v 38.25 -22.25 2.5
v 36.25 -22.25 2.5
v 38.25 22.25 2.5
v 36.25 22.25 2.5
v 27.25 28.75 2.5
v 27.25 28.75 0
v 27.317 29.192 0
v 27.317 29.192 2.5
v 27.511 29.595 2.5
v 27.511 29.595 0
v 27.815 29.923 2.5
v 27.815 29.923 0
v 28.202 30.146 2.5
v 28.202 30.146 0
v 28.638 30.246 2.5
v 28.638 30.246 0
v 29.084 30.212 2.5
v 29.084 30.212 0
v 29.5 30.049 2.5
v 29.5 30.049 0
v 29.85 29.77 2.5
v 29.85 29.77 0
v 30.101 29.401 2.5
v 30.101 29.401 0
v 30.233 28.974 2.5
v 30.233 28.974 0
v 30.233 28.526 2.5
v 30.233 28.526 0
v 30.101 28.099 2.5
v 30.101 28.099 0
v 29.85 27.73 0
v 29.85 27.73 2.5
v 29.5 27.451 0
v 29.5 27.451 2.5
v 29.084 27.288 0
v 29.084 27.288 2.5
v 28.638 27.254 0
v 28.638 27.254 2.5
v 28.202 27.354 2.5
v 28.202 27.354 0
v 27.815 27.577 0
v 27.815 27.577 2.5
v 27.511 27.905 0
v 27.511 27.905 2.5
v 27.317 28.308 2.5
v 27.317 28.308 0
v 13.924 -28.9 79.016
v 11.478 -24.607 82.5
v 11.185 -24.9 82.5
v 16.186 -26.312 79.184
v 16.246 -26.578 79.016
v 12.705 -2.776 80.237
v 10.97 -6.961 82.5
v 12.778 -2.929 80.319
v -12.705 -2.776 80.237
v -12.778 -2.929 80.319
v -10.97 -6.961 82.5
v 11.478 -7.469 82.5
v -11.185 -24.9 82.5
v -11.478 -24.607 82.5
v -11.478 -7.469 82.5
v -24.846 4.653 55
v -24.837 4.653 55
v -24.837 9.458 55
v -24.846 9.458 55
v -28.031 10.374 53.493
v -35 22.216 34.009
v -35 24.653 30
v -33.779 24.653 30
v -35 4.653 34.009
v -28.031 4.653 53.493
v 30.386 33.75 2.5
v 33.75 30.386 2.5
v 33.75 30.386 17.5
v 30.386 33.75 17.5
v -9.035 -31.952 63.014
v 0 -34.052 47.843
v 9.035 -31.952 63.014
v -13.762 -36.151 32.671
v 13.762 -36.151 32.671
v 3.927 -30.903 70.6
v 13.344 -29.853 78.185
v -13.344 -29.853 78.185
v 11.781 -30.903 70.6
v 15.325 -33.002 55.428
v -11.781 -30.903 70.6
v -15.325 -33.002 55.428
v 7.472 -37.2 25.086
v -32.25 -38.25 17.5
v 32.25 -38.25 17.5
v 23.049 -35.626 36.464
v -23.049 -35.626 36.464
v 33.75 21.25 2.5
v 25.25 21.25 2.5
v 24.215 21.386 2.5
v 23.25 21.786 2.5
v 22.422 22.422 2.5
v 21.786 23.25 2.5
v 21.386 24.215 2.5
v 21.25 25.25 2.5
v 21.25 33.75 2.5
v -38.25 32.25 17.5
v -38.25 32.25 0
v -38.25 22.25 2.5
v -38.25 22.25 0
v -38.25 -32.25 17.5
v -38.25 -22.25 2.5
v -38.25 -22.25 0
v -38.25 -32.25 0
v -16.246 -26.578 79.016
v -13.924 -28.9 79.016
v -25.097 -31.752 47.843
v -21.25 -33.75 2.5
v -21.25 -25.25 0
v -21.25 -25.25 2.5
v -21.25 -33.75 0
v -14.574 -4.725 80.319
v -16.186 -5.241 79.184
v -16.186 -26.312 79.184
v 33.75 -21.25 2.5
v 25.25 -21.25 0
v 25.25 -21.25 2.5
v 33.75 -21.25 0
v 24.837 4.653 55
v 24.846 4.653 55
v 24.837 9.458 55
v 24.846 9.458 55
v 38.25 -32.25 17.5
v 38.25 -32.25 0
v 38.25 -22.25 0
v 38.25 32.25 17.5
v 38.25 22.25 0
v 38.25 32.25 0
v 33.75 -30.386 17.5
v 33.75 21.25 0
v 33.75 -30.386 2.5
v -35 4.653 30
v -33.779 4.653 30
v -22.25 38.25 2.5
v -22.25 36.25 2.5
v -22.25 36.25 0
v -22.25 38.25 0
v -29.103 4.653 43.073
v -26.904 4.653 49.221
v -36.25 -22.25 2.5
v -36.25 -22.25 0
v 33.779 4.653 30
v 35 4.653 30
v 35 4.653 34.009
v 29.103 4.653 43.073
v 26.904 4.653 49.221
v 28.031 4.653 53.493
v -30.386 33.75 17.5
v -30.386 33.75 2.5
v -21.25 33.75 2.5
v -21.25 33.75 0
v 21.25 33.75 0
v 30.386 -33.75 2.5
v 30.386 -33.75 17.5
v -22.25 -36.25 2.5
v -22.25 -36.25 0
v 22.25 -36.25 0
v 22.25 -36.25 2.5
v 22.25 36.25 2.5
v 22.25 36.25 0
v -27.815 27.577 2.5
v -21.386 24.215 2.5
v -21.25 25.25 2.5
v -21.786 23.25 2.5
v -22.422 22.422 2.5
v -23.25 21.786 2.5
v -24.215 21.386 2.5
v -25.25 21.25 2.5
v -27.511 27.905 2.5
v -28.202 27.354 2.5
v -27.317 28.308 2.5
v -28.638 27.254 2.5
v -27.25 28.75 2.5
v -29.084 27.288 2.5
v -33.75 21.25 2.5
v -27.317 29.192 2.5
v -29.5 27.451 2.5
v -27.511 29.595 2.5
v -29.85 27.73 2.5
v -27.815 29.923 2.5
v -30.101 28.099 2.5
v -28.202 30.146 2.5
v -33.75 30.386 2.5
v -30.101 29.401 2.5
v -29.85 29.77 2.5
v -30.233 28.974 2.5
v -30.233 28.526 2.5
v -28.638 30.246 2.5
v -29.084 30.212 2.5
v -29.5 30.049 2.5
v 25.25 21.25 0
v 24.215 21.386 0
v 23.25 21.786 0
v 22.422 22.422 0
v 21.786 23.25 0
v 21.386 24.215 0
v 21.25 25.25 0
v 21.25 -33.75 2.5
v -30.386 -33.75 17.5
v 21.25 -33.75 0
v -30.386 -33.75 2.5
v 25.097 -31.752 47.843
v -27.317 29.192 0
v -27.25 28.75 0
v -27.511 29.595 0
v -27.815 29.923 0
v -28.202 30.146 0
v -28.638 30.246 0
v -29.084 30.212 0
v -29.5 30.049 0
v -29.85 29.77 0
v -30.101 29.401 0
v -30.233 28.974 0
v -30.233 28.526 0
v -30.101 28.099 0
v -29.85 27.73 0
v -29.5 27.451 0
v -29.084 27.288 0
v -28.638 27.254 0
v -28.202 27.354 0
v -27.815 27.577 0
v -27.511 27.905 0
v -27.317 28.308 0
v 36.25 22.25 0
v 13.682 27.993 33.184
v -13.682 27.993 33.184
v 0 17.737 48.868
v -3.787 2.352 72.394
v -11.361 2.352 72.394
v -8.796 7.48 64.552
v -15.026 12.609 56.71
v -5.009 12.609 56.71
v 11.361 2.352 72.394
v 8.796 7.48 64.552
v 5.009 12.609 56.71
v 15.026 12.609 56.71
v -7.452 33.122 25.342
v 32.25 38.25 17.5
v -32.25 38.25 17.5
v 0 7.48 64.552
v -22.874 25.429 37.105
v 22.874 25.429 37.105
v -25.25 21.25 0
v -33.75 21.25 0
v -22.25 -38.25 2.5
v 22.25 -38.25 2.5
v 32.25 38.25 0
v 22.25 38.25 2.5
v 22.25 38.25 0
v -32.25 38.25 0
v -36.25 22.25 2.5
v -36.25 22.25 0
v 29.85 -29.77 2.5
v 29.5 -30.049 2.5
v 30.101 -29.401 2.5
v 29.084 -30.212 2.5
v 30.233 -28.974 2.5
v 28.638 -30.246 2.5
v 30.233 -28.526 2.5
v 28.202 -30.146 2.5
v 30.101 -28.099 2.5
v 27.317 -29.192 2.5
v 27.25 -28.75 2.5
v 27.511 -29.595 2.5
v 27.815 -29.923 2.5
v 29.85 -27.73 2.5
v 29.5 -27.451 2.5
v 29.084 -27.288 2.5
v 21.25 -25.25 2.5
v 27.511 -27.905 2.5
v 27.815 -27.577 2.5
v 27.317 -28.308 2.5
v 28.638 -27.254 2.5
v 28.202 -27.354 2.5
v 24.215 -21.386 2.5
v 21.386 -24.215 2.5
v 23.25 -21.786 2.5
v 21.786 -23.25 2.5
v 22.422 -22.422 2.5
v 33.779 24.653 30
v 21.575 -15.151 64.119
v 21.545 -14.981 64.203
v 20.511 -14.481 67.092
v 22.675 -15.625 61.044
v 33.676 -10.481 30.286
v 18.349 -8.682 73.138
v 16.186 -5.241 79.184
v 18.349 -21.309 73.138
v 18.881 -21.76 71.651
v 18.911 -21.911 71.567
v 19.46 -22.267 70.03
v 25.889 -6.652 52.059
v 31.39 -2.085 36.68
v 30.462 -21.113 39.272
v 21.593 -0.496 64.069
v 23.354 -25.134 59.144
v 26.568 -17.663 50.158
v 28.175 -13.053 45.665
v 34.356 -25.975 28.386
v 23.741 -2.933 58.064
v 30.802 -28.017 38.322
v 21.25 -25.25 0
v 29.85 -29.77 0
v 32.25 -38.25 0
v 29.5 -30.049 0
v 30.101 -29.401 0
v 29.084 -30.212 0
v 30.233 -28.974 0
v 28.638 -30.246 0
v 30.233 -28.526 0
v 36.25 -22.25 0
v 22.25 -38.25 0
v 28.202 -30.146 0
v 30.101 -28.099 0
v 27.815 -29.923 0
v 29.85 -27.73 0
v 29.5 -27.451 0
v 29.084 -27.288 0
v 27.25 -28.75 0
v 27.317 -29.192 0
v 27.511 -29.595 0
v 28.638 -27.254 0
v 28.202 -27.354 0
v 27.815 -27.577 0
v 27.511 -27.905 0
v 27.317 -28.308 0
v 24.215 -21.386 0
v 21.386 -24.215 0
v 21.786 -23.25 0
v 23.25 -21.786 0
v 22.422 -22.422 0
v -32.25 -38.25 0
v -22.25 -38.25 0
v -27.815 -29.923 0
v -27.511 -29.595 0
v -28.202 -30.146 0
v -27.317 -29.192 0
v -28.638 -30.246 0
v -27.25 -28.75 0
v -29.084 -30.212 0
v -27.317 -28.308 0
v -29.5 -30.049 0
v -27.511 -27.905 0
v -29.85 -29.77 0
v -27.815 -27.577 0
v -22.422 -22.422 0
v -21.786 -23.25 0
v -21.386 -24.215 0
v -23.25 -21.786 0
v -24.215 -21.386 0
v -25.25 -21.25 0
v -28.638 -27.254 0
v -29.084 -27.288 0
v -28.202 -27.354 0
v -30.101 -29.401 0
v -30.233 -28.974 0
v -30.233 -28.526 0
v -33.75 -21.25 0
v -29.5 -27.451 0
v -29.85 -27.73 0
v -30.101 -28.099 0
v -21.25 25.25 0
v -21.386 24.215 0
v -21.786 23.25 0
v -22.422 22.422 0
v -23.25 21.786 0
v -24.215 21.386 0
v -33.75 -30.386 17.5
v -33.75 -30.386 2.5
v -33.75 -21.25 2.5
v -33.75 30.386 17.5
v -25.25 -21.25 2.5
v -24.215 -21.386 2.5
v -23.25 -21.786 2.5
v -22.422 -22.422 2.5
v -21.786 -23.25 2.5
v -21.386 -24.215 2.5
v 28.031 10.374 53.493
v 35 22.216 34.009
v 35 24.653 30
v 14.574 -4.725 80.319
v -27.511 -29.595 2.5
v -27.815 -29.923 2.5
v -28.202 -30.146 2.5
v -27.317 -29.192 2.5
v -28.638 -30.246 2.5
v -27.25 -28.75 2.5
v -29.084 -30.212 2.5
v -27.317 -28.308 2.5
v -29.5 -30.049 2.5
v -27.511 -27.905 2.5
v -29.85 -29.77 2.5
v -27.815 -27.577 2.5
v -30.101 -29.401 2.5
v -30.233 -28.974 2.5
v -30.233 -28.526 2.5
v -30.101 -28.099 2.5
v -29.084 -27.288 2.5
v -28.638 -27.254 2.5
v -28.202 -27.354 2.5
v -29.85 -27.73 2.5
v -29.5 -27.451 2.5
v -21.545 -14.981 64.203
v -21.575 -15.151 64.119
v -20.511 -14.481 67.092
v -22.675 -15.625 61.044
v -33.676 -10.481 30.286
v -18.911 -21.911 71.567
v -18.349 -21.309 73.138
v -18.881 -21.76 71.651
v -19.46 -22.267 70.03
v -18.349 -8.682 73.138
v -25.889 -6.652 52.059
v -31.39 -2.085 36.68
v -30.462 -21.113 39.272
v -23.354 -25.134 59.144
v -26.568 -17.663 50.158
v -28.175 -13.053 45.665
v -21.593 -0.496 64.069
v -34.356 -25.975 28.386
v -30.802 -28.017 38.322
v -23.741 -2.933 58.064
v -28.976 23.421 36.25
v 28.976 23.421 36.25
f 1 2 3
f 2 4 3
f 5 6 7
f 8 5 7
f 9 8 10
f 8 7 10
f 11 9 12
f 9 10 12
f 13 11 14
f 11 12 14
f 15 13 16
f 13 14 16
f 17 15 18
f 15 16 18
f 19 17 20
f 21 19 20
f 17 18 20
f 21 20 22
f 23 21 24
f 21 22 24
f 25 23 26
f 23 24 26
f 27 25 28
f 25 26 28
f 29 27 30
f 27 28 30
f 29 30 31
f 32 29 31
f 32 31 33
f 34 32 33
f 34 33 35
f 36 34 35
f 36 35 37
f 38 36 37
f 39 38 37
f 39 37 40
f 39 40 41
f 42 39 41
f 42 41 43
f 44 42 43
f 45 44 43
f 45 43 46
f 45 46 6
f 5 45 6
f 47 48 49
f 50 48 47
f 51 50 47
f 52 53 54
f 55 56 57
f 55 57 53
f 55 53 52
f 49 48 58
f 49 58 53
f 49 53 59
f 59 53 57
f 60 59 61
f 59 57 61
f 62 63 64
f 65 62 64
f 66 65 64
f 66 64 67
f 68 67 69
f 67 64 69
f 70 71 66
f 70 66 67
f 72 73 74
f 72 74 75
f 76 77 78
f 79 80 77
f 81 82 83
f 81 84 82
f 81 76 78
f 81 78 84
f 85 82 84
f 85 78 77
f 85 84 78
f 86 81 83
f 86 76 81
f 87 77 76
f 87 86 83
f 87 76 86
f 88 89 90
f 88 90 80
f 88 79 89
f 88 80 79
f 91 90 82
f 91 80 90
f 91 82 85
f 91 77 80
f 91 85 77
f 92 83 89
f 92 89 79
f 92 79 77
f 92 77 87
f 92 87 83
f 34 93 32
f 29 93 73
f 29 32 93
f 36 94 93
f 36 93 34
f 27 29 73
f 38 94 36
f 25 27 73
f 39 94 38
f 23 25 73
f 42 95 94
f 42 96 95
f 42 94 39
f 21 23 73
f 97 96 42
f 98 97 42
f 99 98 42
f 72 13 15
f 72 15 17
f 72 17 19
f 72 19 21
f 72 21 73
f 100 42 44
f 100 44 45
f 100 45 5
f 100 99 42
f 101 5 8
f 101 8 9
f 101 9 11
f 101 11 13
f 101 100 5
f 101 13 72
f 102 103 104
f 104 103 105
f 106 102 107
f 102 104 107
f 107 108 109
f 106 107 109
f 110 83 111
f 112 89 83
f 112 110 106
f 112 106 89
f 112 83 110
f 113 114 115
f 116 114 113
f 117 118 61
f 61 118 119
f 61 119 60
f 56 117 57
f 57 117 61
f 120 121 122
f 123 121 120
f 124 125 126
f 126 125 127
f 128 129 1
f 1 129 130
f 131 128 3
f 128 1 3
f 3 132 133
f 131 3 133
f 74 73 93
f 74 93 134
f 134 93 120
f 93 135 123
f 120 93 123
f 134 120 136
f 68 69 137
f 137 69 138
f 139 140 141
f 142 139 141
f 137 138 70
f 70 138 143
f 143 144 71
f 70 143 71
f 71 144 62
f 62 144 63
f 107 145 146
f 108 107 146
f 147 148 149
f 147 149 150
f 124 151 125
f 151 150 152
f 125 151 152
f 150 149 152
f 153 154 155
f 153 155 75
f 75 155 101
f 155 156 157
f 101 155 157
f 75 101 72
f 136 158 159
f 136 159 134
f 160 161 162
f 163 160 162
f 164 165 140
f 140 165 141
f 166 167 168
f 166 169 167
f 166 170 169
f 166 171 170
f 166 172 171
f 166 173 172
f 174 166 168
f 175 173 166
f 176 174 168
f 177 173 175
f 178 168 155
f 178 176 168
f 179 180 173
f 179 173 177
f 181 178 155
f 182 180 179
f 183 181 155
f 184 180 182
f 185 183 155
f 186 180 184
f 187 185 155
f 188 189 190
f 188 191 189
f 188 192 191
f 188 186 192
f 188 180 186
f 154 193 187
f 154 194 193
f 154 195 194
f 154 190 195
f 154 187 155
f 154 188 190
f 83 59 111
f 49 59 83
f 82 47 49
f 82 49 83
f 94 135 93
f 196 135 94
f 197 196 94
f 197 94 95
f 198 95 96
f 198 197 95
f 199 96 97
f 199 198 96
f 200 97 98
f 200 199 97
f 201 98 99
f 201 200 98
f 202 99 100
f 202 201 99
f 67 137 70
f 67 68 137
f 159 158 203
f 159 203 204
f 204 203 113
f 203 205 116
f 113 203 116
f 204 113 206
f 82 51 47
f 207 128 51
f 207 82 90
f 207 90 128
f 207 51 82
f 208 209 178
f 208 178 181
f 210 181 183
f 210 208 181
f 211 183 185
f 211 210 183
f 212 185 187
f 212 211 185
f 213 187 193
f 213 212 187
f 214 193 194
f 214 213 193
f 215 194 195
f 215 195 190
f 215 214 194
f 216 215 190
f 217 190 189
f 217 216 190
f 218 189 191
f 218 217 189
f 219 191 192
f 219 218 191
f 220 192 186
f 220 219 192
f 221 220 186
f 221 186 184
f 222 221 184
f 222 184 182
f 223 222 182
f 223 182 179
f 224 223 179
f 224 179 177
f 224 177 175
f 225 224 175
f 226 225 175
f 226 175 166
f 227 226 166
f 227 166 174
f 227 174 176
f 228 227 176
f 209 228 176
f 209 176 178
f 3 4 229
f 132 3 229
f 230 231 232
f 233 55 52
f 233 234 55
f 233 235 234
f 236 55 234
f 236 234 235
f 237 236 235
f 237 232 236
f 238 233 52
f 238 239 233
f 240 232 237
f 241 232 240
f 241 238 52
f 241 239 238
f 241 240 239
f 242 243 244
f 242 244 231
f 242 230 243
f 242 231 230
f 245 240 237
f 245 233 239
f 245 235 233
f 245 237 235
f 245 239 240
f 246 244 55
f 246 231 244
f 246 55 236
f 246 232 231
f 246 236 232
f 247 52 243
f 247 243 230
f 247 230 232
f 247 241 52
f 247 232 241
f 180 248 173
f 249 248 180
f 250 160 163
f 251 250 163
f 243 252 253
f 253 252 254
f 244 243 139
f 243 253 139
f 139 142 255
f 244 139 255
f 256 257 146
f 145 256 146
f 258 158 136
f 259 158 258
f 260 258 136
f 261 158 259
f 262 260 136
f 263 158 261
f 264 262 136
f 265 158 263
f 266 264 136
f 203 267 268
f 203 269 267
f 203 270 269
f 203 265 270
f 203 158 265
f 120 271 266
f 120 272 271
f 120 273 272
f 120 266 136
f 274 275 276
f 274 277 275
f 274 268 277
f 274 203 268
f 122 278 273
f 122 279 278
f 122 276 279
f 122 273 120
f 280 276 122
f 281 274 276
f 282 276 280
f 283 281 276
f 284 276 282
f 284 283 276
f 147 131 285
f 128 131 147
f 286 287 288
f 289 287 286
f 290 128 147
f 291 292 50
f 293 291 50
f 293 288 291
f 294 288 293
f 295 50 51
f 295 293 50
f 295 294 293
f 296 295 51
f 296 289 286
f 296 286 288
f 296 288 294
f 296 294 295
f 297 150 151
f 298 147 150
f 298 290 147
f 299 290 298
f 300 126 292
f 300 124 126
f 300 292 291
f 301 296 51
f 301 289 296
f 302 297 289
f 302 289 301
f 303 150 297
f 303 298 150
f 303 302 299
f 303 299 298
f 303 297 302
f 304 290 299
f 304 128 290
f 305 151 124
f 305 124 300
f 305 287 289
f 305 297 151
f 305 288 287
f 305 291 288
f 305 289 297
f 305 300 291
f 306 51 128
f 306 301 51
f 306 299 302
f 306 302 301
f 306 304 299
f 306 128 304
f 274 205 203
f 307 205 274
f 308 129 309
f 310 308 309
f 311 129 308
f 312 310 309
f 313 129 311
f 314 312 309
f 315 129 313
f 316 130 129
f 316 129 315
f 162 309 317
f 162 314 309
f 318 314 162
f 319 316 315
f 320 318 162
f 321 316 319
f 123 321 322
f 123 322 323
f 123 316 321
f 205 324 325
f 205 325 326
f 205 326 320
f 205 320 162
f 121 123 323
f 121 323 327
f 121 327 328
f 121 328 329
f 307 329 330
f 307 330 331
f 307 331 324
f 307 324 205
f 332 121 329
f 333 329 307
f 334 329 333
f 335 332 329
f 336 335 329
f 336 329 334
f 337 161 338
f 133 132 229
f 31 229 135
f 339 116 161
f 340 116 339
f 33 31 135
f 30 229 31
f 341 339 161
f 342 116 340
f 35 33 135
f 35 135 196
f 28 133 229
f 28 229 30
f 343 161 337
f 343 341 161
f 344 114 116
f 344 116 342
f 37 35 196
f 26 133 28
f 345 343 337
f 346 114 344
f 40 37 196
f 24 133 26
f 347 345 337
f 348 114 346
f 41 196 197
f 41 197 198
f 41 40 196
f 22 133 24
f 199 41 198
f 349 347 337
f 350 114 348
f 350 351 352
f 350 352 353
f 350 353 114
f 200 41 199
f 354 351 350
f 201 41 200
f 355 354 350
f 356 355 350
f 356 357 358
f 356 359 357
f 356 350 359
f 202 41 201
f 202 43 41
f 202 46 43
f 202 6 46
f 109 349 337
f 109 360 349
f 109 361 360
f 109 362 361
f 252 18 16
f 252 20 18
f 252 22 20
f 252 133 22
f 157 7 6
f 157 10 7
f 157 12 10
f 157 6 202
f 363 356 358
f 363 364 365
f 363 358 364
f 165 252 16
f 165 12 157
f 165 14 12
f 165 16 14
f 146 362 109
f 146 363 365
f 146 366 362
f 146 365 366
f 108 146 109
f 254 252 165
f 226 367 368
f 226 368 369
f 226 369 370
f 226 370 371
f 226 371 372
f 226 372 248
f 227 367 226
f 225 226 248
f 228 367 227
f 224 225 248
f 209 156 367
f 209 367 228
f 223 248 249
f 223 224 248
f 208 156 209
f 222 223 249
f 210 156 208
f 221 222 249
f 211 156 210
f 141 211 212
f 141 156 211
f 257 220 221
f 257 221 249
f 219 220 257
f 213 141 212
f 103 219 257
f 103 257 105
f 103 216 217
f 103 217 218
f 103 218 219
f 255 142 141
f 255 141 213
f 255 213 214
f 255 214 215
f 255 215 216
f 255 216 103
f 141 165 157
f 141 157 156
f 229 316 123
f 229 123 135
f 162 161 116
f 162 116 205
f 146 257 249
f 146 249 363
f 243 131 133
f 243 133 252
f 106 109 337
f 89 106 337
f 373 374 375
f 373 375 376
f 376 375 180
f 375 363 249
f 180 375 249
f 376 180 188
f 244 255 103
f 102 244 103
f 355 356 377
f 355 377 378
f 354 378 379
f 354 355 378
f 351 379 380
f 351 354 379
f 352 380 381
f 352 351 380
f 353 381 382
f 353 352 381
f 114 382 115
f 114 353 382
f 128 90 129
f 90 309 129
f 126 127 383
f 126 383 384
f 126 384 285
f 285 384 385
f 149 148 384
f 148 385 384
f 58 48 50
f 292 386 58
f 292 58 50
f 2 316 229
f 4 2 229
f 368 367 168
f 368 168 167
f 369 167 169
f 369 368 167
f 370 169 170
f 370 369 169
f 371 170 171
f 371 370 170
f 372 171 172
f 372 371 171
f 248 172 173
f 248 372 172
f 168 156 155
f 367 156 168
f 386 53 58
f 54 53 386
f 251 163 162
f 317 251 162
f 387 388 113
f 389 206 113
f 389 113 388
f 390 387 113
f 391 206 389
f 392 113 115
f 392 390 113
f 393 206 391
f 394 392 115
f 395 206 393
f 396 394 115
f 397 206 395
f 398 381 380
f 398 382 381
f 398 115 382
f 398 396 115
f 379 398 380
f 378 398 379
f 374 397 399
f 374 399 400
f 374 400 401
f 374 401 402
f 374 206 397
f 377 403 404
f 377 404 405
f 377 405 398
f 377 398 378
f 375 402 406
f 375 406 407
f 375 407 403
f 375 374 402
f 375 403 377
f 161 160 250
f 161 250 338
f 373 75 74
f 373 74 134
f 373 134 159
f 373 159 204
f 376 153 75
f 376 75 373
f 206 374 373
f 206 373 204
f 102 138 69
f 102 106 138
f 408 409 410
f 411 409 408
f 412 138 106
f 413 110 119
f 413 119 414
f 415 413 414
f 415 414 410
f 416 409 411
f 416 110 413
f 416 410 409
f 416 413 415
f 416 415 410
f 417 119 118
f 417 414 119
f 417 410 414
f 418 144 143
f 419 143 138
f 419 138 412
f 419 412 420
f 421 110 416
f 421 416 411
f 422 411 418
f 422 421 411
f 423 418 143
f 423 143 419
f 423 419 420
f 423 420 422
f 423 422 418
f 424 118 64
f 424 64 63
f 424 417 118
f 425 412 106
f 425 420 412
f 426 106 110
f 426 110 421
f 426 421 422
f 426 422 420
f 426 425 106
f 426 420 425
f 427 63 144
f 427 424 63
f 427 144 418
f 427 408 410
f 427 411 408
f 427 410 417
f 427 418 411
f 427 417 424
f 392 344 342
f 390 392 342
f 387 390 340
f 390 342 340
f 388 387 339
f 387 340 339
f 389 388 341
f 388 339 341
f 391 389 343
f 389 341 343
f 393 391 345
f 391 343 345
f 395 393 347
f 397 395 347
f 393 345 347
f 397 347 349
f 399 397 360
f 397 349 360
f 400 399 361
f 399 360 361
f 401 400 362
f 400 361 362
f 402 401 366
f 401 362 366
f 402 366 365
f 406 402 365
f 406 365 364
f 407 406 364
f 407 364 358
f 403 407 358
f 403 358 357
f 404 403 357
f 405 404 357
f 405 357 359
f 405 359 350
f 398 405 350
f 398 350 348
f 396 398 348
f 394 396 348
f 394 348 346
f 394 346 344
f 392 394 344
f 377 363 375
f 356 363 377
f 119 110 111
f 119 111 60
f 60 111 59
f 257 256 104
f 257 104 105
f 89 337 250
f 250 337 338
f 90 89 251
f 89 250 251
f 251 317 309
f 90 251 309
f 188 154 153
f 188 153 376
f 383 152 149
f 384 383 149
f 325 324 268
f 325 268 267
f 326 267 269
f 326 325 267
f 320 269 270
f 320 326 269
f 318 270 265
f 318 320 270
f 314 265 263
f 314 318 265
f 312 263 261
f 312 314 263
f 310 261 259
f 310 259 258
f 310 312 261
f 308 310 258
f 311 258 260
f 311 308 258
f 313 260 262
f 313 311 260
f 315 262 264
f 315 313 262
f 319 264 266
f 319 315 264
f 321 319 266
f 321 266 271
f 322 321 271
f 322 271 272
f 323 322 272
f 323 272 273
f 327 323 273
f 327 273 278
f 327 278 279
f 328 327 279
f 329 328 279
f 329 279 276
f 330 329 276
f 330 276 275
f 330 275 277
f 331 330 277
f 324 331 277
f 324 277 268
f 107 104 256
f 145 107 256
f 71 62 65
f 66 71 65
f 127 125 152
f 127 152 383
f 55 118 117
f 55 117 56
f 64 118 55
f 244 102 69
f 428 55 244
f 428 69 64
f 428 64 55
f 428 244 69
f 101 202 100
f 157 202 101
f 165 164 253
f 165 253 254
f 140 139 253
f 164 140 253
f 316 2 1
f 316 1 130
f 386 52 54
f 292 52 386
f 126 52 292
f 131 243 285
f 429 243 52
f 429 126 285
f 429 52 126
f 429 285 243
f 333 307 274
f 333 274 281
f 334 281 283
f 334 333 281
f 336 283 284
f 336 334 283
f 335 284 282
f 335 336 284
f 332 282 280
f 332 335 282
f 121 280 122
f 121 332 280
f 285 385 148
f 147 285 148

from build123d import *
from OCP.BRepFilletAPI import BRepFilletAPI_MakeChamfer

# Parameters (mm, degrees)
BOSS_EXTRUDE1_DEPTH            = 55
SKETCH2_W                      = 67.5
SKETCH2_H                      = 67.5
BOSS_EXTRUDE2_DEPTH            = 2.5
CUT_EXTRUDE1_REACH             = 75.378
SKETCH3_W                      = 16.5
SKETCH3_H                      = 7
SKETCH3_W_2                    = 8
SKETCH3_H_2                    = 16
FILLET1_R                      = 1
CUT_EXTRUDE2_REACH             = 77.187
SKETCH4_R                      = 1.5
MIRROR2_COPY_1_REACH           = 77.187
MIRROR2_COPY_1_SKETCH_R        = 1.5
BOSS_EXTRUDE3_DEPTH            = 16.09
BOSS_EXTRUDE3_DEPTH_BACK       = 23.81
BOSS_EXTRUDE4_DEPTH            = 47
SKETCH7_W                      = 39.9
SKETCH7_H                      = 19.5
CUT_EXTRUDE3_DEPTH             = 9.4
BOSS_EXTRUDE7_DEPTH            = 2
CUT_EXTRUDE6_REACH             = 85.213
CUT_EXTRUDE6_DIRECTION_2_DEPTH = 84.213490493
CUT_EXTRUDE7_REACH             = 74.438
SKETCH14_W                     = 14.7
SKETCH14_H                     = 2
CUT_EXTRUDE8_DEPTH             = 104.526192338
CUT_EXTRUDE8_DEPTH_BACK        = 2.5
SKETCH15_R                     = 1.6
SKETCH16_W                     = 7.5
SKETCH16_H                     = 2.5
BOSS_EXTRUDE8_DEPTH            = 7
CUT_EXTRUDE5_DEPTH             = 2
CUT_EXTRUDE9_REACH             = 74.438
SKETCH17_R                     = 1
SKETCH19_R                     = 3
CUT_EXTRUDE10_DEPTH            = 2.5
BOSS_EXTRUDE9_DEPTH            = 2
CIRPATTERN1_COUNT              = 4
CIRPATTERN2_COUNT              = 4
CUT_EXTRUDE11_DEPTH            = 2.5
BOSS_EXTRUDE12_DEPTH           = 55
CUT_EXTRUDE12_DEPTH            = 85.104012984
CUT_EXTRUDE12_DEPTH_BACK       = 85.104012984
SKETCH23_W                     = 53.743256412
SKETCH23_H                     = 84.17088144
BOSS_EXTRUDE13_DEPTH           = 15
BOSS_EXTRUDE14_DEPTH           = 35
BOSS_EXTRUDE14_DEPTH_BACK      = 35
CUT_EXTRUDE13_REACH            = 94.676
CHAMFER2_SIZE                  = 1.6
CHAMFER2_SIZE2                 = 2.645578105


with BuildPart() as part:
    # Sketch1 → Boss-Extrude1 (new body)
    with BuildSketch(Plane.XY):
        with BuildLine():
            Line((-36.25, 32.25), (-36.25, -32.25))
            ThreePointArc((-36.25, -32.25), (-35.078427125, -35.078427125), (-32.25, -36.25))
            Line((-32.25, -36.25), (32.25, -36.25))
            ThreePointArc((32.25, -36.25), (35.078427125, -35.078427125), (36.25, -32.25))
            Line((36.25, -32.25), (36.25, 32.25))
            ThreePointArc((36.25, 32.25), (35.078427125, 35.078427125), (32.25, 36.25))
            Line((32.25, 36.25), (-32.25, 36.25))
            ThreePointArc((-32.25, 36.25), (-35.078427125, 35.078427125), (-36.25, 32.25))
        make_face()
        with BuildLine():
            Line((-31.75, 33.75), (31.75, 33.75))
            ThreePointArc((31.75, 33.75), (33.164213562, 33.164213562), (33.75, 31.75))
            Line((33.75, 31.75), (33.75, -31.75))
            ThreePointArc((33.75, -31.75), (33.164213562, -33.164213562), (31.75, -33.75))
            Line((31.75, -33.75), (-31.75, -33.75))
            ThreePointArc((-31.75, -33.75), (-33.164213562, -33.164213562), (-33.75, -31.75))
            Line((-33.75, -31.75), (-33.75, 31.75))
            ThreePointArc((-33.75, 31.75), (-33.164213562, 33.164213562), (-31.75, 33.75))
        make_face(mode=Mode.SUBTRACT)
    extrude(amount=BOSS_EXTRUDE1_DEPTH)

    # Sketch2 → Boss-Extrude2 (add)
    with BuildSketch(Plane.XY):
        Rectangle(SKETCH2_W, SKETCH2_H)
    extrude(amount=BOSS_EXTRUDE2_DEPTH)

    # Sketch3 → Cut-Extrude1 (cut, up to next)
    with BuildSketch(Plane.XY.offset(2.5), mode=Mode.PRIVATE) as cut_extrude1_sk1:
        with Locations((-11.63, 14.79)):
            Rectangle(SKETCH3_W, SKETCH3_H)
    cut_extrude1_tool1 = extrude(cut_extrude1_sk1.sketch, amount=-CUT_EXTRUDE1_REACH, mode=Mode.PRIVATE) & part.part
    # Sketch3 → Cut-Extrude1 (cut, up to next)
    with BuildSketch(Plane.XY.offset(2.5), mode=Mode.PRIVATE) as cut_extrude1_sk2:
        Rectangle(SKETCH3_W_2, SKETCH3_H_2)
    cut_extrude1_tool2 = extrude(cut_extrude1_sk2.sketch, amount=-CUT_EXTRUDE1_REACH, mode=Mode.PRIVATE) & part.part
    add(cut_extrude1_tool1.solids().sort_by_distance((-11.63, 14.79, 2.5))[0], mode=Mode.SUBTRACT)
    add(cut_extrude1_tool2.solids().sort_by_distance((0, 0, 2.5))[0], mode=Mode.SUBTRACT)

    # Fillet1
    fillet1_edges = [part.edges().sort_by_distance(p)[0] for p in [
        (-19.88, 11.29, 1.25),
        (-19.88, 18.29, 1.25),
        (-3.38, 18.29, 1.25),
        (-3.38, 11.29, 1.25),
        (4, -8, 1.25),
        (-4, -8, 1.25),
        (-4, 8, 1.25),
        (4, 8, 1.25),
    ]]
    fillet(fillet1_edges, radius=FILLET1_R)

    # Sketch4 → Cut-Extrude2 (cut, up to next)
    with BuildSketch(Plane(origin=(0, 0, 0), x_dir=(-1, 0, 0), z_dir=(0, 0, -1)), mode=Mode.PRIVATE) as cut_extrude2_sk1:
        with Locations((-28.75, 28.75)):
            Circle(SKETCH4_R)
    cut_extrude2_tool1 = extrude(cut_extrude2_sk1.sketch, amount=-CUT_EXTRUDE2_REACH, mode=Mode.PRIVATE) & part.part
    cut_extrude2 = cut_extrude2_tool1.solids().sort_by_distance((28.75, 28.75, 0))[0]
    add(cut_extrude2, mode=Mode.SUBTRACT)

    # Mirror1: Cut-Extrude2 across plane
    add(cut_extrude2.mirror(Plane(origin=(0, 0, 0), x_dir=(0, 0, 1), z_dir=(1, 0, 0))), mode=Mode.SUBTRACT)

    # Mirror2: Cut-Extrude2 across plane
    add(cut_extrude2.mirror(Plane.ZX), mode=Mode.SUBTRACT)

    # Mirror2 copy 1 sketch → Mirror2 copy 1 (cut, up to next)
    with BuildSketch(Plane(origin=(0, 0, 0), x_dir=(1, 0, 0), z_dir=(0, 0, -1)), mode=Mode.PRIVATE) as mirror2_copy_1_sk1:
        with Locations((-28.75, 28.75)):
            Circle(MIRROR2_COPY_1_SKETCH_R)
    mirror2_copy_1_tool1 = extrude(mirror2_copy_1_sk1.sketch, amount=-MIRROR2_COPY_1_REACH, mode=Mode.PRIVATE) & part.part
    add(mirror2_copy_1_tool1.solids().sort_by_distance((-28.75, -28.75, 0))[0], mode=Mode.SUBTRACT)



with BuildPart() as body_2:
    # Sketch5 → Boss-Extrude3 (new, two sides: drawn at the far end of the back side and taken through both)
    with BuildSketch(Plane(origin=(0, 0, 0), x_dir=(0, 0, -1), z_dir=(1, 0, 0)).offset(-BOSS_EXTRUDE3_DEPTH_BACK)):
        Polygon((-14.7, 14), (-64.4, 14), (-64.4, 12), (-62.4, 12), (-16.7, 12), (-16.7, -12), (-62.4, -12), (-64.4, -12), (-64.4, -14), (-14.7, -14), align=None)
    extrude(amount=BOSS_EXTRUDE3_DEPTH + BOSS_EXTRUDE3_DEPTH_BACK)


with BuildPart() as part_1:
    add(part.part)

    add(body_2.part)  # Boss-Extrude4 merges body 2
    # Sketch6 → Boss-Extrude4 (add)
    with BuildSketch(Plane.XY.offset(64.4)):
        Polygon((-23.81, -14), (16.09, -14), (16.09, -16.5), (-2.11, -16.5), (-2.11, -31.25), (16.09, -31.25), (16.09, -33.75), (-23.81, -33.75), (-23.81, -31.25), (-5.61, -31.25), (-5.61, -16.5), (-23.81, -16.5), align=None)
    extrude(amount=-BOSS_EXTRUDE4_DEPTH)

    # Sketch7 → Cut-Extrude3 (cut)
    with BuildSketch(Plane.XY.offset(64.4)):
        with Locations((-3.86, -24)):
            Rectangle(SKETCH7_W, SKETCH7_H)
    extrude(amount=-CUT_EXTRUDE3_DEPTH, mode=Mode.SUBTRACT)

    # Sketch12 → Boss-Extrude7 (add)
    with BuildSketch(Plane(origin=(0, 36.25, 0), x_dir=(1, 0, 0), z_dir=(0, 1, 0))):
        Polygon((29.75, -55), (32.25, -55), (32.25, -52.5), (32.25, -45), (29.75, -45), (29.75, -52.5), (22.25, -52.5), (22.25, -55), align=None)
        Polygon((-32.25, 0), (-32.25, -10), (-29.75, -10), (-29.75, -2.5), (-22.25, -2.5), (-22.25, 0), align=None)
    boss_extrude7 = extrude(amount=BOSS_EXTRUDE7_DEPTH)

    # Sketch13 → Cut-Extrude6 (cut, up to next)
    with BuildSketch(Plane(origin=(0, 0, 0), x_dir=(-1, 0, 0), z_dir=(0, 0, -1)), mode=Mode.PRIVATE) as cut_extrude6_sk1:
        with BuildLine():
            Line((-33.75, 21.25), (-25.25, 21.25))
            ThreePointArc((-25.25, 21.25), (-22.421572875, 22.421572875), (-21.25, 25.25))
            Line((-21.25, 25.25), (-21.25, 33.75))
            Line((-21.25, 33.75), (21.25, 33.75))
            Line((21.25, 33.75), (21.25, 25.25))
            ThreePointArc((21.25, 25.25), (22.421572875, 22.421572875), (25.25, 21.25))
            Line((25.25, 21.25), (33.75, 21.25))
            Line((33.75, 21.25), (33.75, -21.25))
            Line((33.75, -21.25), (25.25, -21.25))
            ThreePointArc((25.25, -21.25), (22.421572875, -22.421572875), (21.25, -25.25))
            Line((21.25, -25.25), (21.25, -33.75))
            Line((21.25, -33.75), (-21.25, -33.75))
            Line((-21.25, -33.75), (-21.25, -25.25))
            ThreePointArc((-21.25, -25.25), (-22.421572875, -22.421572875), (-25.25, -21.25))
            Line((-25.25, -21.25), (-33.75, -21.25))
            Line((-33.75, -21.25), (-33.75, 21.25))
        make_face()
    cut_extrude6_tool1 = extrude(cut_extrude6_sk1.sketch, amount=-CUT_EXTRUDE6_REACH, mode=Mode.PRIVATE) & part_1.part
    add(cut_extrude6_tool1.solids().sort_by_distance((0, 0, 0))[0], mode=Mode.SUBTRACT)

    # Sketch13 → Cut-Extrude6 direction 2 (cut)
    with BuildSketch(Plane(origin=(0, 0, 0), x_dir=(-1, 0, 0), z_dir=(0, 0, -1))):
        with BuildLine():
            Line((-33.75, 21.25), (-25.25, 21.25))
            ThreePointArc((-25.25, 21.25), (-22.421572875, 22.421572875), (-21.25, 25.25))
            Line((-21.25, 25.25), (-21.25, 33.75))
            Line((-21.25, 33.75), (21.25, 33.75))
            Line((21.25, 33.75), (21.25, 25.25))
            ThreePointArc((21.25, 25.25), (22.421572875, 22.421572875), (25.25, 21.25))
            Line((25.25, 21.25), (33.75, 21.25))
            Line((33.75, 21.25), (33.75, -21.25))
            Line((33.75, -21.25), (25.25, -21.25))
            ThreePointArc((25.25, -21.25), (22.421572875, -22.421572875), (21.25, -25.25))
            Line((21.25, -25.25), (21.25, -33.75))
            Line((21.25, -33.75), (-21.25, -33.75))
            Line((-21.25, -33.75), (-21.25, -25.25))
            ThreePointArc((-21.25, -25.25), (-22.421572875, -22.421572875), (-25.25, -21.25))
            Line((-25.25, -21.25), (-33.75, -21.25))
            Line((-33.75, -21.25), (-33.75, 21.25))
        make_face()
    extrude(amount=CUT_EXTRUDE6_DIRECTION_2_DEPTH, mode=Mode.SUBTRACT)

    # Sketch14 → Cut-Extrude7 (cut, up to next)
    with BuildSketch(Plane(origin=(0, 0, 14.7), x_dir=(-1, 0, 0), z_dir=(0, 0, -1)), mode=Mode.PRIVATE) as cut_extrude7_sk1:
        with Locations((16.46, 13)):
            Rectangle(SKETCH14_W, SKETCH14_H)
    cut_extrude7_tool1 = extrude(cut_extrude7_sk1.sketch, amount=-CUT_EXTRUDE7_REACH, mode=Mode.PRIVATE) & part_1.part
    add(cut_extrude7_tool1.solids().sort_by_distance((-16.46, 13, 14.7))[0], mode=Mode.SUBTRACT)

    # Sketch15 → Cut-Extrude8 (cut, two sides: drawn at the far end of the back side and taken through both)
    with BuildSketch(Plane(origin=(0, 36.25, 0), x_dir=(1, 0, 0), z_dir=(0, 1, 0)).offset(-CUT_EXTRUDE8_DEPTH_BACK)):
        with Locations(Location((3.25, -45, 0), (0, 0, 90))):
            Circle(SKETCH15_R)
    extrude(amount=CUT_EXTRUDE8_DEPTH + CUT_EXTRUDE8_DEPTH_BACK, mode=Mode.SUBTRACT)

    # Sketch16 → Boss-Extrude8 (add)
    with BuildSketch(Plane(origin=(-33.75, 0, 0), x_dir=(0, 0, -1), z_dir=(1, 0, 0))):
        with Locations((-12.25, 30.9)):
            Rectangle(SKETCH16_W, SKETCH16_H)
    extrude(amount=BOSS_EXTRUDE8_DEPTH)

    # Sketch11 → Cut-Extrude5 (cut)
    with BuildSketch(Plane(origin=(0, 14, 0), x_dir=(1, 0, 0), z_dir=(0, 1, 0))):
        Polygon((1.19, -39.55), (12.59, -39.55), (12.59, -14.7), (16.09, -14.7), (16.09, -64.4), (12.59, -64.4), (1.19, -64.4), (-23.81, -64.4), (-23.81, -14.7), (1.19, -14.7), align=None)
    extrude(amount=-CUT_EXTRUDE5_DEPTH, mode=Mode.SUBTRACT)

    # Sketch17 → Cut-Extrude9 (cut, up to next)
    with BuildSketch(Plane(origin=(0, 0, 14.7), x_dir=(-1, 0, 0), z_dir=(0, 0, -1)), mode=Mode.PRIVATE) as cut_extrude9_sk1:
        with Locations(Location((-13.59, 9, 0), (0, 0, 90))):
            Circle(SKETCH17_R)
    cut_extrude9_tool1 = extrude(cut_extrude9_sk1.sketch, amount=-CUT_EXTRUDE9_REACH, mode=Mode.PRIVATE) & part_1.part
    # Sketch17 → Cut-Extrude9 (cut, up to next)
    with BuildSketch(Plane(origin=(0, 0, 14.7), x_dir=(-1, 0, 0), z_dir=(0, 0, -1)), mode=Mode.PRIVATE) as cut_extrude9_sk2:
        with Locations(Location((-13.59, -9, 0), (0, 0, 90))):
            Circle(SKETCH17_R)
    cut_extrude9_tool2 = extrude(cut_extrude9_sk2.sketch, amount=-CUT_EXTRUDE9_REACH, mode=Mode.PRIVATE) & part_1.part
    # Sketch17 → Cut-Extrude9 (cut, up to next)
    with BuildSketch(Plane(origin=(0, 0, 14.7), x_dir=(-1, 0, 0), z_dir=(0, 0, -1)), mode=Mode.PRIVATE) as cut_extrude9_sk3:
        with Locations(Location((21.31, -9, 0), (0, 0, 90))):
            Circle(SKETCH17_R)
    cut_extrude9_tool3 = extrude(cut_extrude9_sk3.sketch, amount=-CUT_EXTRUDE9_REACH, mode=Mode.PRIVATE) & part_1.part
    add(cut_extrude9_tool1.solids().sort_by_distance((13.59, 9, 14.7))[0], mode=Mode.SUBTRACT)
    add(cut_extrude9_tool2.solids().sort_by_distance((13.59, -9, 14.7))[0], mode=Mode.SUBTRACT)
    add(cut_extrude9_tool3.solids().sort_by_distance((-21.31, -9, 14.7))[0], mode=Mode.SUBTRACT)

    # Sketch19 → Cut-Extrude10 (cut)
    with BuildSketch(Plane(origin=(0, 36.25, 0), x_dir=(1, 0, 0), z_dir=(0, 1, 0))):
        with Locations(Location((0, -27.5, 0), (0, 0, 270))):
            Circle(SKETCH19_R)
    cut_extrude10 = extrude(amount=-CUT_EXTRUDE10_DEPTH, mode=Mode.SUBTRACT)

    # Sketch20 → Boss-Extrude9 (add)
    with BuildSketch(Plane(origin=(36.25, 0, -36.25), x_dir=(0, 0, 1), z_dir=(-1, 0, 0))):
        Polygon((91.25, 32.25), (81.25, 32.25), (81.25, 29.75), (88.75, 29.75), (88.75, 22.25), (91.25, 22.25), align=None)
        Polygon((36.25, -22.25), (36.25, -32.25), (46.25, -32.25), (46.25, -29.75), (38.75, -29.75), (38.75, -22.25), align=None)
    boss_extrude9 = extrude(amount=-BOSS_EXTRUDE9_DEPTH)

    # CirPattern1: Boss-Extrude7, Cut-Extrude10 ×4 about axis
    cirpattern1_axis = Axis((0, 0, 0), (0, 0, 1))
    add([boss_extrude7.rotate(cirpattern1_axis, i * 360 / CIRPATTERN1_COUNT) for i in range(1, CIRPATTERN1_COUNT)])
    add([cut_extrude10.rotate(cirpattern1_axis, i * 360 / CIRPATTERN1_COUNT) for i in range(1, CIRPATTERN1_COUNT)], mode=Mode.SUBTRACT)

    # CirPattern2: Boss-Extrude9 ×4 about axis
    cirpattern2_axis = Axis((0, 0, 0), (0, 0, 1))
    for i in range(1, CIRPATTERN2_COUNT):
        add(boss_extrude9.rotate(cirpattern2_axis, i * 360 / CIRPATTERN2_COUNT))

    # Sketch21 → Cut-Extrude11 (cut)
    with BuildSketch(Plane.XZ.offset(33.75)):
        with BuildLine():
            Line((-2.11, 25.367419404), (-2.11, 29.632580596))
            ThreePointArc((-2.11, 29.632580596), (3, 27.5), (-2.11, 25.367419404))
        make_face()
    extrude(amount=-CUT_EXTRUDE11_DEPTH, mode=Mode.SUBTRACT)

    # Sketch22 → Boss-Extrude12 (add, through all)
    with BuildSketch(Plane.XY.offset(55)):
        Polygon((-38.25, 32.25), (-32.25, 38.25), (-29.75, 38.25), (-29.75, 33.75), (-33.75, 33.75), (-33.75, 29.75), (-38.25, 29.75), align=None)
        Polygon((33.75, 33.75), (33.75, 29.75), (38.25, 29.75), (38.25, 32.25), (32.25, 38.25), (29.75, 38.25), (29.75, 33.75), align=None)
        Polygon((38.25, -32.25), (32.25, -38.25), (29.75, -38.25), (29.75, -33.75), (33.75, -33.75), (33.75, -29.75), (38.25, -29.75), align=None)
        Polygon((-33.75, -33.75), (-33.75, -29.75), (-38.25, -29.75), (-38.25, -32.25), (-32.25, -38.25), (-29.75, -38.25), (-29.75, -33.75), align=None)
    extrude(amount=-BOSS_EXTRUDE12_DEPTH)

    # Sketch23 → Cut-Extrude12 (cut, two sides: drawn at the far end of the back side and taken through both)
    with BuildSketch(Plane(origin=(0, 0, 0), x_dir=(0, 0, -1), z_dir=(1, 0, 0)).offset(-CUT_EXTRUDE12_DEPTH_BACK)):
        with Locations((-29.371628206, -1.519752026)):
            Rectangle(SKETCH23_W, SKETCH23_H)
    extrude(amount=CUT_EXTRUDE12_DEPTH + CUT_EXTRUDE12_DEPTH_BACK, mode=Mode.SUBTRACT)


with BuildPart() as body_2_2:
    # of the pieces the cut leaves, the one that is kept (cut_extrude12_keep)
    add(part_1.part.solids().sort_by_distance((-36.25, 22.25, 0))[0])



with BuildPart() as body_2_3:
    # Loft1: read off the stored shape, not the designer's step
    # Loft1: loft between two sections, ruled curve by curve
    loft1_from = [
        Edge.make_line((-15, -26.256240287, 82.5), (-15, -7.256240287, 82.5)),
        Edge.make_line((-15, -7.256240287, 82.5), (-12, -4.256240287, 82.5)),
        Edge.make_line((-12, -29.256240287, 82.5), (-15, -26.256240287, 82.5)),
        Edge.make_line((12, -29.256240287, 82.5), (-12, -29.256240287, 82.5)),
        Edge.make_line((15, -26.256240287, 82.5), (12, -29.256240287, 82.5)),
        Edge.make_line((15, -7.256240287, 82.5), (15, -26.256240287, 82.5)),
        Edge.make_line((12, -4.256240287, 82.5), (15, -7.256240287, 82.5)),
        Edge.make_line((-12, -4.256240287, 82.5), (12, -4.256240287, 82.5)),
    ]
    loft1_to = [
        Edge.make_line((-38.25, -32.25, 17.5), (-38.25, 32.25, 17.5)),
        Edge.make_line((-38.25, 32.25, 17.5), (-32.25, 38.25, 17.5)),
        Edge.make_line((-32.25, -38.25, 17.5), (-38.25, -32.25, 17.5)),
        Edge.make_line((32.25, -38.25, 17.5), (-32.25, -38.25, 17.5)),
        Edge.make_line((38.25, -32.25, 17.5), (32.25, -38.25, 17.5)),
        Edge.make_line((38.25, 32.25, 17.5), (38.25, -32.25, 17.5)),
        Edge.make_line((32.25, 38.25, 17.5), (38.25, 32.25, 17.5)),
        Edge.make_line((-32.25, 38.25, 17.5), (32.25, 38.25, 17.5)),
    ]
    loft1 = Solid(Shell([*[Face.make_surface_from_curves(loft1_from[k], loft1_to[k]) for k in range(8)], Face(Wire(loft1_from)), Face(Wire(loft1_to))]))
    add(loft1)


with BuildPart() as body_2_2_1:
    add(body_2_2.part)

    add(body_2_3.part)  # Boss-Extrude13 merges body 2 3
    # Sketch29 → Boss-Extrude13 (add)
    with BuildSketch(Plane.XY.offset(2.5)):
        Polygon((-38.25, -32.25), (-32.25, -38.25), (32.25, -38.25), (38.25, -32.25), (38.25, 32.25), (32.25, 38.25), (-32.25, 38.25), (-38.25, 32.25), align=None)
        Polygon((-33.75, -30.386038969), (-30.386038969, -33.75), (30.386038969, -33.75), (33.75, -30.386038969), (33.75, 30.386038969), (30.386038969, 33.75), (-30.386038969, 33.75), (-33.75, 30.386038969), align=None, mode=Mode.SUBTRACT)
    extrude(amount=BOSS_EXTRUDE13_DEPTH)

    # Sketch30 → Boss-Extrude14 (add, two sides: drawn at the far end of the back side and taken through both)
    with BuildSketch(Plane.ZY.offset(-BOSS_EXTRUDE14_DEPTH_BACK)):
        Polygon((55, 4.652646099), (55, 9.457938296), (30, 24.652646099), (30, 4.652646099), align=None)
    extrude(amount=BOSS_EXTRUDE14_DEPTH + BOSS_EXTRUDE14_DEPTH_BACK)

    # Cut-Extrude13: up to this plane
    cut_extrude13_end = Plane(origin=(35, 31.317429352, 19.034367525), z_dir=(0, 0.8545427354341548, 0.5193810867914928))
    # Sketch31 → Cut-Extrude13 (cut, up to the surface)
    with BuildSketch(Plane(origin=(0, 0, 7.249003184), x_dir=(1, 0, 0), z_dir=(0, 1, 0)), mode=Mode.PRIVATE) as cut_extrude13_sk1:
        Polygon((26.055561267, -51.765885066), (36.727591717, -21.930101014), (36.727591717, -51.765885066), align=None)
    cut_extrude13_tool1 = split(extrude(cut_extrude13_sk1.sketch, amount=CUT_EXTRUDE13_REACH, mode=Mode.PRIVATE), bisect_by=cut_extrude13_end, keep=Keep.BOTH, mode=Mode.PRIVATE)
    add(cut_extrude13_tool1.solids().sort_by_distance((33.170248, 0, 49.069627))[0], mode=Mode.SUBTRACT)
    # Sketch31 → Cut-Extrude13 (cut, up to the surface)
    with BuildSketch(Plane(origin=(0, 0, 7.249003184), x_dir=(1, 0, 0), z_dir=(0, 1, 0)), mode=Mode.PRIVATE) as cut_extrude13_sk2:
        Polygon((-36.727591717, -51.765885066), (-26.055561267, -51.765885066), (-36.727591717, -21.930101014), align=None)
    cut_extrude13_tool2 = split(extrude(cut_extrude13_sk2.sketch, amount=CUT_EXTRUDE13_REACH, mode=Mode.PRIVATE), bisect_by=cut_extrude13_end, keep=Keep.BOTH, mode=Mode.PRIVATE)
    add(cut_extrude13_tool2.solids().sort_by_distance((-33.170248, 0, 49.069627))[0], mode=Mode.SUBTRACT)

    # Fillet2
    # the kernel refuses this chamfer: 5 mm, written as the material it takes off along each edge
    with BuildSketch(Plane(origin=(-5.247952216, -36.008288071, 82.5), x_dir=(-0.21436575688805004, -0.21436575688805004, -0.9529400004972123), z_dir=(-0.7071067811865476, 0.7071067811865476, 0))) as fillet2_piece_1:
        with BuildLine():
            Line((3.817710171, 0.118054313), (-1.269871725, -3.602259509))
            Line((-1.269871725, -3.602259509), (-1.365165725, -3.571943613))
            ThreePointArc((-1.365165725, -3.571943613), (-0.673980524, -1.78870847), (-0.095294, 0.030315896))
            Line((-0.095294, 0.030315896), (0, 0.1))
            ThreePointArc((0, 0.1), (1.908855085, 0.1), (3.817710171, 0.218054313))
            Line((3.817710171, 0.218054313), (3.817710171, 0.118054313))
        make_face()
    extrude(amount=23.340315788, mode=Mode.SUBTRACT)
    with BuildSketch(Plane(origin=(23.271310582, -29.256240287, 82.5), x_dir=(0, 1, 0), z_dir=(-1, 0, 0))) as fillet2_piece_2:
        with BuildLine():
            Line((4.506609807, -0.131372771), (-0.747807784, 4.446074029))
            Line((-0.747807784, 4.446074029), (-0.846864062, 4.432368055))
            ThreePointArc((-0.846864062, 4.432368055), (-0.407893681, 2.218333999), (-0.099056278, -0.013705975))
            Line((-0.099056278, -0.013705975), (0, -0.1))
            ThreePointArc((0, -0.1), (2.253304903, -0.1), (4.506609807, -0.231372771))
            Line((4.506609807, -0.231372771), (4.506609807, -0.131372771))
        make_face()
    extrude(amount=46.542621164, mode=Mode.SUBTRACT)
    with BuildSketch(Plane(origin=(21.752047784, -19.504192503, 82.5), x_dir=(-0.7071067811865475, 0.7071067811865475, -1.166012717588788e-14), z_dir=(-0.7071067811865476, -0.7071067811865476, 0))) as fillet2_piece_3:
        with BuildLine():
            Line((3.817710171, -0.118054313), (-1.269871725, 3.602259509))
            Line((-1.269871725, 3.602259509), (-1.365165725, 3.571943613))
            ThreePointArc((-1.365165725, 3.571943613), (-0.673980524, 1.78870847), (-0.095294, -0.030315896))
            Line((-0.095294, -0.030315896), (0, -0.1))
            ThreePointArc((0, -0.1), (1.908855085, -0.1), (3.817710171, -0.218054313))
            Line((3.817710171, -0.218054313), (3.817710171, -0.118054313))
        make_face()
    extrude(amount=23.340315788, mode=Mode.SUBTRACT)
    with BuildSketch(Plane(origin=(15, 1.961468954, 82.5), x_dir=(-1, 0, 0), z_dir=(0, -1, 0))) as fillet2_piece_4:
        with BuildLine():
            Line((3.685284533, -0.115169859), (-1.349627479, 3.43119394))
            Line((-1.349627479, 3.43119394), (-1.443785272, 3.397514421))
            ThreePointArc((-1.443785272, 3.397514421), (-0.714750834, 1.701311778), (-0.094157793, -0.033679518))
            Line((-0.094157793, -0.033679518), (0, -0.1))
            ThreePointArc((0, -0.1), (1.842642266, -0.1), (3.685284533, -0.215169859))
            Line((3.685284533, -0.215169859), (3.685284533, -0.115169859))
        make_face()
    extrude(amount=37.435418481, mode=Mode.SUBTRACT)
    with BuildSketch(Plane(origin=(-15, -35.473949528, 82.5), x_dir=(-0.33679518377841833, 0, -0.9415779331439652), z_dir=(0, 1, 0))) as fillet2_piece_5:
        with BuildLine():
            Line((3.685284533, 0.115169859), (-1.349627479, -3.43119394))
            Line((-1.349627479, -3.43119394), (-1.443785272, -3.397514421))
            ThreePointArc((-1.443785272, -3.397514421), (-0.714750834, -1.701311778), (-0.094157793, 0.033679518))
            Line((-0.094157793, 0.033679518), (0, 0.1))
            ThreePointArc((0, 0.1), (1.842642266, 0.1), (3.685284533, 0.215169859))
            Line((3.685284533, 0.215169859), (3.685284533, 0.115169859))
        make_face()
    extrude(amount=37.435418481, mode=Mode.SUBTRACT)
    with BuildSketch(Plane(origin=(-19.983321594, -12.239561881, 82.5), x_dir=(-0.39868992538477815, 0.39868992538477815, -0.8258890281347488), z_dir=(0.7071067811865476, 0.7071067811865476, 0))) as fillet2_piece_6:
        with BuildLine():
            Line((2.817444723, 0.093398854), (-1.665704554, -2.274235356))
            Line((-1.665704554, -2.274235356), (-1.748293456, -2.217852086))
            ThreePointArc((-1.748293456, -2.217852086), (-0.876872635, -1.107065072), (-0.082588903, 0.05638327))
            Line((-0.082588903, 0.05638327), (0, 0.1))
            ThreePointArc((0, 0.1), (1.408722362, 0.1), (2.817444723, 0.193398854))
            Line((2.817444723, 0.193398854), (2.817444723, 0.093398854))
        make_face()
    extrude(amount=18.337602655, mode=Mode.SUBTRACT)
    with BuildSketch(Plane(origin=(7.016678406, 0.727081307, 82.5), x_dir=(-0.7071067811865476, -0.7071067811865476, -1.61450741225738e-14), z_dir=(0.7071067811865476, -0.7071067811865476, 0))) as fillet2_piece_7:
        with BuildLine():
            Line((2.817444723, -0.093398854), (-1.665704554, 2.274235356))
            Line((-1.665704554, 2.274235356), (-1.748293456, 2.217852086))
            ThreePointArc((-1.748293456, 2.217852086), (-0.876872635, 1.107065072), (-0.082588903, -0.05638327))
            Line((-0.082588903, -0.05638327), (0, -0.1))
            ThreePointArc((0, -0.1), (1.408722362, -0.1), (2.817444723, -0.193398854))
            Line((2.817444723, -0.193398854), (2.817444723, -0.093398854))
        make_face()
    extrude(amount=18.337602655, mode=Mode.SUBTRACT)
    with BuildSketch(Plane(origin=(-19.204926804, -4.256240287, 82.5), x_dir=(0, -1, 0), z_dir=(1, 0, 0))) as fillet2_piece_8:
        with BuildLine():
            Line((2.880399513, -0.095151916), (-1.656094682, 2.358623676))
            Line((-1.656094682, 2.358623676), (-1.739787962, 2.303893112))
            ThreePointArc((-1.739787962, 2.303893112), (-0.871922742, 1.150619864), (-0.083693281, -0.054730565))
            Line((-0.083693281, -0.054730565), (0, -0.1))
            ThreePointArc((0, -0.1), (1.440199756, -0.1), (2.880399513, -0.195151916))
            Line((2.880399513, -0.195151916), (2.880399513, -0.095151916))
        make_face()
    extrude(amount=38.409853609, mode=Mode.SUBTRACT)

    # Chamfer2: one chamfer whose edges measure the first distance from different faces: ONE call of the kernel's chamfer builder (chamfer() names one face for all edges)
    chamfer2_edges_1 = [body_2_2_1.edges().sort_by_distance(p)[0] for p in [
        (27.491655911, 7.055292197, 55),
    ]]
    chamfer2_side_1 = [body_2_2_1.faces().sort_by_distance(p)[0] for p in [
        (31.959566033, 10.851213292, 42.509068474),
    ]]
    chamfer2_edges_2 = [body_2_2_1.edges().sort_by_distance(p)[0] for p in [
        (-27.491655911, 7.055292197, 55),
    ]]
    chamfer2_side_2 = [body_2_2_1.faces().sort_by_distance(p)[0] for p in [
        (-31.959566033, 10.851213292, 42.509068474),
    ]]
    chamfer2 = BRepFilletAPI_MakeChamfer(body_2_2_1.part.solid().wrapped)
    for e in chamfer2_edges_1:
        chamfer2.Add(CHAMFER2_SIZE, CHAMFER2_SIZE2, e.wrapped, chamfer2_side_1[0].wrapped)  # the first distance lies on this face
    for e in chamfer2_edges_2:
        chamfer2.Add(CHAMFER2_SIZE, CHAMFER2_SIZE2, e.wrapped, chamfer2_side_2[0].wrapped)  # the first distance lies on this face
    add(Compound.cast(chamfer2.Shape()), mode=Mode.REPLACE)


solid = body_2_2_1.part
